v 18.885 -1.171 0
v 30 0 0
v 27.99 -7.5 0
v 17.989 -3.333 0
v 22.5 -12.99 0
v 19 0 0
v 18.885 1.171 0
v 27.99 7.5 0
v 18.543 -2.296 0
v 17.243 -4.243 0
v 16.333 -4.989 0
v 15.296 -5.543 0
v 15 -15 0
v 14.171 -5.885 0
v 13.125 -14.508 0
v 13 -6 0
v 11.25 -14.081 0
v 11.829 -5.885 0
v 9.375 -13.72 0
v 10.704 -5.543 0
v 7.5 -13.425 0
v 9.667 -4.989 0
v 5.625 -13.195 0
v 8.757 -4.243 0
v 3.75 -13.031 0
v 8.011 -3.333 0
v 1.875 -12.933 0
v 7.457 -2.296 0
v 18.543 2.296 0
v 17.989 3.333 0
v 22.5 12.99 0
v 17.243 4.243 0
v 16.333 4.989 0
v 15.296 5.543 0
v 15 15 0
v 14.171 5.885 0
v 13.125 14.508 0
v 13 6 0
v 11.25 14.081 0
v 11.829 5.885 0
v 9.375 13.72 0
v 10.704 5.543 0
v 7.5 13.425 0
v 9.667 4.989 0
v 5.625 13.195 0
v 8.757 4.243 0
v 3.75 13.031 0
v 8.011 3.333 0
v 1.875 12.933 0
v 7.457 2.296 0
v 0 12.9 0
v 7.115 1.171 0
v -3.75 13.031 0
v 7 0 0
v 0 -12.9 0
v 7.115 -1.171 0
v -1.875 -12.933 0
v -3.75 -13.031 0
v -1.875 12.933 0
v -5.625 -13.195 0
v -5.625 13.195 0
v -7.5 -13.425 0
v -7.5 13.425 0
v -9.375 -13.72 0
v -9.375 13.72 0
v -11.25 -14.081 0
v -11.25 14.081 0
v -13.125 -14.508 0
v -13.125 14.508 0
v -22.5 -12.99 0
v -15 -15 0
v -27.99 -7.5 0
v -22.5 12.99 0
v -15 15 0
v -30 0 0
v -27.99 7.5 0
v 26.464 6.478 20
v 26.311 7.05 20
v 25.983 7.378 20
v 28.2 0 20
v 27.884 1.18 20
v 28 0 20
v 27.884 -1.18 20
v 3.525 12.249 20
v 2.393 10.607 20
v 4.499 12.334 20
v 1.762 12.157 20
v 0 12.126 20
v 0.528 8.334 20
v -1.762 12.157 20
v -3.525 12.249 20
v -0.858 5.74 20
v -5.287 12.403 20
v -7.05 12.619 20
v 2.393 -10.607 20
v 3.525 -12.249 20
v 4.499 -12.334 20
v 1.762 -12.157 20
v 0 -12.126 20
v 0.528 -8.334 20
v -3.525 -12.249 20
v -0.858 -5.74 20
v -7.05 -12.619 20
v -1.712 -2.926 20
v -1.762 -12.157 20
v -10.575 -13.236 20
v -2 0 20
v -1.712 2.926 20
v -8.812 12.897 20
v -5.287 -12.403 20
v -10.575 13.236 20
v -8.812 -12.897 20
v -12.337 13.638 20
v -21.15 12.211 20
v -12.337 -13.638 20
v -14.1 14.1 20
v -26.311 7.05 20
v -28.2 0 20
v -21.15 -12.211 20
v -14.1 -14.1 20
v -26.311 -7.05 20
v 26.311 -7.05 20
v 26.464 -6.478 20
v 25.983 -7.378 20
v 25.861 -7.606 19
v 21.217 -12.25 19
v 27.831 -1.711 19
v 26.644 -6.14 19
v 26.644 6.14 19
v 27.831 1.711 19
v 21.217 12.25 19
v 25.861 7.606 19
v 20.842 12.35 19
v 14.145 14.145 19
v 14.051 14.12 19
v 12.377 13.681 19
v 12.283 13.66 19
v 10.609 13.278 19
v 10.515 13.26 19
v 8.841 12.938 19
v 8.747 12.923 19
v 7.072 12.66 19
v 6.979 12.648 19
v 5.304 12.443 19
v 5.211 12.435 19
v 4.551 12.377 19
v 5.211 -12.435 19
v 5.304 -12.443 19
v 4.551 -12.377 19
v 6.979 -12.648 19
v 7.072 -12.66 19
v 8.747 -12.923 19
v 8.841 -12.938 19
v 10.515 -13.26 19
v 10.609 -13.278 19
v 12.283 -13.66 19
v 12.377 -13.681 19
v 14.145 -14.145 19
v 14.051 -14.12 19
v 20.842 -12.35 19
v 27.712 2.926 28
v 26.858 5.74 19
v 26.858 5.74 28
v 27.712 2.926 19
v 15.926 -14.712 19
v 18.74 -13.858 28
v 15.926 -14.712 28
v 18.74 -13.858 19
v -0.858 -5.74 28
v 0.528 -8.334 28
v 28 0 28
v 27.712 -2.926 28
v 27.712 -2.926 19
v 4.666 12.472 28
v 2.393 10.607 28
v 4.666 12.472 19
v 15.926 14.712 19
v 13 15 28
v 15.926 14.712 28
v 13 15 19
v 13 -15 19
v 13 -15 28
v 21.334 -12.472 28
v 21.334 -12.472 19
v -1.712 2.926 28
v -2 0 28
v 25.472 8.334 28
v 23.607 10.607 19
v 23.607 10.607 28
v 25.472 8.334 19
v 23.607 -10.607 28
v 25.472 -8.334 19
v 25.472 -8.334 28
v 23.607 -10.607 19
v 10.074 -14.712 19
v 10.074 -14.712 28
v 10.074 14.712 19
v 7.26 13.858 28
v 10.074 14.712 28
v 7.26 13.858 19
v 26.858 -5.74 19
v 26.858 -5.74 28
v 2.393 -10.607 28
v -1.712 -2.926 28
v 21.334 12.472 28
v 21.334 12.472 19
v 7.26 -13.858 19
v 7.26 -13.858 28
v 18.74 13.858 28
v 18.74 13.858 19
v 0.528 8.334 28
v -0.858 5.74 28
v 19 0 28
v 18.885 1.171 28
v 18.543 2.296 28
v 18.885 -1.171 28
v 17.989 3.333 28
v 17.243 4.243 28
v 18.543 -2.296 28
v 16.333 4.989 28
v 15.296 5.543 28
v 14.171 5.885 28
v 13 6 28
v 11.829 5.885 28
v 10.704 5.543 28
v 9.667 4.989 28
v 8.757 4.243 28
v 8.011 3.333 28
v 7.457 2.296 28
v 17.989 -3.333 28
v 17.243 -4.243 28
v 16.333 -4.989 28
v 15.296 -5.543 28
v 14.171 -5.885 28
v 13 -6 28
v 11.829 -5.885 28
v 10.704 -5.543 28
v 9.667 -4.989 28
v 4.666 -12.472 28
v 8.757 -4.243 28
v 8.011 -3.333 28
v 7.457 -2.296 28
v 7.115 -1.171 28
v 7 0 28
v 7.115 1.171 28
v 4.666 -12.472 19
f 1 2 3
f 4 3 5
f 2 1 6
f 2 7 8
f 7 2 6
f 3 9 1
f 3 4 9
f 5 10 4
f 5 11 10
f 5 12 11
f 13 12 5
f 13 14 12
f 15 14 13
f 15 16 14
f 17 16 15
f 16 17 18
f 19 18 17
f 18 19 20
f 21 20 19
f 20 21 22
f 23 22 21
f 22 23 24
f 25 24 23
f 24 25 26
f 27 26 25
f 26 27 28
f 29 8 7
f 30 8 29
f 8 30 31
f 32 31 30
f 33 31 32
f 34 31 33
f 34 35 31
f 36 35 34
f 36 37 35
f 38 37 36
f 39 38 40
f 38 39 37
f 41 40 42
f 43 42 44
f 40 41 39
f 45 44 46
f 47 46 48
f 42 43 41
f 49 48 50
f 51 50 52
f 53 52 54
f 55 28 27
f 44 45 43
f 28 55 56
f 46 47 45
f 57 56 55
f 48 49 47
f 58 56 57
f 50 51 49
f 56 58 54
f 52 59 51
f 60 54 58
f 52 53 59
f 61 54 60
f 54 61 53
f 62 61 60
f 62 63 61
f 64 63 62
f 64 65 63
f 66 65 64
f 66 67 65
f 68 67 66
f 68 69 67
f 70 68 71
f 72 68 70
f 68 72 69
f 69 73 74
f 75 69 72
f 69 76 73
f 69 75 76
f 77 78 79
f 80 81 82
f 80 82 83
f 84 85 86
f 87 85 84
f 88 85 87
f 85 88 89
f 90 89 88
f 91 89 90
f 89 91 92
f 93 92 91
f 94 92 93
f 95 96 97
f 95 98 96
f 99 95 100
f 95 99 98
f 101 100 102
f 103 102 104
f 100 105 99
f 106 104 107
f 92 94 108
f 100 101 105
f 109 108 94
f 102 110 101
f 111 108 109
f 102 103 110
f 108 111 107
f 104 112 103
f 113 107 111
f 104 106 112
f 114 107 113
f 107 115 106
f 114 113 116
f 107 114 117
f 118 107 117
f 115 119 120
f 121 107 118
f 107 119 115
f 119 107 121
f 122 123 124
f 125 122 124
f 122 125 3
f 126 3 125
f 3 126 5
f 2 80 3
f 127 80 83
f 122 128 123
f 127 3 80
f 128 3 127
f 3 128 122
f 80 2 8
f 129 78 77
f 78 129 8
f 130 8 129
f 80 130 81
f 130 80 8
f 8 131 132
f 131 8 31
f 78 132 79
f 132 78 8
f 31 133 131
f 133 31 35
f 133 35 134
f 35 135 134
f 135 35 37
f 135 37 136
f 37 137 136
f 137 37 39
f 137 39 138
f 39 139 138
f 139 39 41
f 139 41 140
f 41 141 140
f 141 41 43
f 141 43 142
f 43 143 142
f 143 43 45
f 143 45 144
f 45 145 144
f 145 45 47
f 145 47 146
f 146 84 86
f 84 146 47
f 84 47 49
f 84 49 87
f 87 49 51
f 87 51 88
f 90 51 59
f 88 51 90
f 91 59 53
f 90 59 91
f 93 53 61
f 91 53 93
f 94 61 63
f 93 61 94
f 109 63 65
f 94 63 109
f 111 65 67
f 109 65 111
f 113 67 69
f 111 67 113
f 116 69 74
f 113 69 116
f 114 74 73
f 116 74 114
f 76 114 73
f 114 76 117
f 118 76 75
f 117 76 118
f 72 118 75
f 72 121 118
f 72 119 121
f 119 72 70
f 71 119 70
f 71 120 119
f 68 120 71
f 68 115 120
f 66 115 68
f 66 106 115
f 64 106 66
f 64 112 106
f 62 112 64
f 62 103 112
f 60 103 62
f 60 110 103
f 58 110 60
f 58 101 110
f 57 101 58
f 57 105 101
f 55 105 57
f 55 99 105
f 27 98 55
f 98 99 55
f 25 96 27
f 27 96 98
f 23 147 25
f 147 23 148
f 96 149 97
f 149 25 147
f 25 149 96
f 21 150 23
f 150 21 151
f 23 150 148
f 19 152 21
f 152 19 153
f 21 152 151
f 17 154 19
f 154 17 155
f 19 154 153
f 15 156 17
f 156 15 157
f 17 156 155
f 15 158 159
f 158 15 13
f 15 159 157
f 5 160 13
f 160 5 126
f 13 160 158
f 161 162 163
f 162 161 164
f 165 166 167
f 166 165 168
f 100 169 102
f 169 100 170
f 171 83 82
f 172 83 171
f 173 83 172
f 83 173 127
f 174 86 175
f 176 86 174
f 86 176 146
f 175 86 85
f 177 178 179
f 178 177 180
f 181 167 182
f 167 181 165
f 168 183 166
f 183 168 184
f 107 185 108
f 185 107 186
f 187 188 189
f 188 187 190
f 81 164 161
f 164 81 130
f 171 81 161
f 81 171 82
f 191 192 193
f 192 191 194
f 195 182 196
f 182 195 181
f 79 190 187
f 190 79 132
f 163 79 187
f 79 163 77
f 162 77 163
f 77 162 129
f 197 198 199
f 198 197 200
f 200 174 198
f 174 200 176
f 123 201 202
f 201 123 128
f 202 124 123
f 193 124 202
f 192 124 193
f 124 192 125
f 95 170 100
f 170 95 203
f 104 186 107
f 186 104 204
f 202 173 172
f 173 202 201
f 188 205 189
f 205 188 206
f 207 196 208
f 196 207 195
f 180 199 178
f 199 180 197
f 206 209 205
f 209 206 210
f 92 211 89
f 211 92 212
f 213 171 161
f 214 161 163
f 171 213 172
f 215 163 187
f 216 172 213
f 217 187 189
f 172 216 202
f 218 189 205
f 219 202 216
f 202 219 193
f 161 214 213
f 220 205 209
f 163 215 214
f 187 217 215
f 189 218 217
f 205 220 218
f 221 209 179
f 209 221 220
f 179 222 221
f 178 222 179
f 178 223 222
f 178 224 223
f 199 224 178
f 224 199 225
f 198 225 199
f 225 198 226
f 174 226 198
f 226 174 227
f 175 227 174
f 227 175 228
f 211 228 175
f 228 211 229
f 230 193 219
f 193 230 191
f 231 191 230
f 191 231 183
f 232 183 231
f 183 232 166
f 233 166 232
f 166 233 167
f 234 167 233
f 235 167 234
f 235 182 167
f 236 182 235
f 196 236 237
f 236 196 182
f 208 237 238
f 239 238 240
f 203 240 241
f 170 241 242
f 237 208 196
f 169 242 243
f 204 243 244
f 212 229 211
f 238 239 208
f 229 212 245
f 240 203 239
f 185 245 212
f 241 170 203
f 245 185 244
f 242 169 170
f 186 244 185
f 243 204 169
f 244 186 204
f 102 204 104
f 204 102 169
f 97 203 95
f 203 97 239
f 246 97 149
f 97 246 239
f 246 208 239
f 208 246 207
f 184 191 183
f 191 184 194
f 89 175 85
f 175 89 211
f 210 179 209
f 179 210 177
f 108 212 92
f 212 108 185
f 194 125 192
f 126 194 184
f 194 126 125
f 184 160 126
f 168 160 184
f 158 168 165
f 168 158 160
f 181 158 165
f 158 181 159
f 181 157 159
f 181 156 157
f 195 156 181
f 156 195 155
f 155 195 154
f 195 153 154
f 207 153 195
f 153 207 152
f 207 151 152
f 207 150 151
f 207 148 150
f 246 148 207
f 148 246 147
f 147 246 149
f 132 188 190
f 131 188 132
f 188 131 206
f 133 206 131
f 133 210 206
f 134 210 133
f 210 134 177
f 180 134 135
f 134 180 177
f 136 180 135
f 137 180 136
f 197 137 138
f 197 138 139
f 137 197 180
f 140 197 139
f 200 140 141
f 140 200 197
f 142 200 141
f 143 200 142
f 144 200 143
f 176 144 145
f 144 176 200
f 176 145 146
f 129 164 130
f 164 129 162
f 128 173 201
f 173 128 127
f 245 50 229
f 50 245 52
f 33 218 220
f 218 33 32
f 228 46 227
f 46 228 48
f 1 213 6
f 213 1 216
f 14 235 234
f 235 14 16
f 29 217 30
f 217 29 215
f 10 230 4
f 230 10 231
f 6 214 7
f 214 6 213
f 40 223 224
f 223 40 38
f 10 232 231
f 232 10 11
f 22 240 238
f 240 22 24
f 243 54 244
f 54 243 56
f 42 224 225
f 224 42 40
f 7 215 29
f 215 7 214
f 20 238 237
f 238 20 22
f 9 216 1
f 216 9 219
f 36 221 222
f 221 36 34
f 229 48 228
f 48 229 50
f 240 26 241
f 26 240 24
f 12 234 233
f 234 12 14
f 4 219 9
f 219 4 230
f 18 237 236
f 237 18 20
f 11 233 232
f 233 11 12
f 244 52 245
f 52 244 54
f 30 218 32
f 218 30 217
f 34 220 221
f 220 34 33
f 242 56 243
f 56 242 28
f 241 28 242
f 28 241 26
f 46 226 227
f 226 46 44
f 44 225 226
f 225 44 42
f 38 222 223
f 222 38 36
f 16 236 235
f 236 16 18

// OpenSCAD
$fn = 32;

// ----------------------------------------------------------------------
// Handle: 60 x 30 mm grip, 20 mm thick
// ----------------------------------------------------------------------

// --- parameters (mm) ---
length = 60;              // grip length
width = 30;               // grip width
thickness = 20;           // grip thickness
waist = 0.86;             // width factor at the middle
draft = 0.94;             // top face scale of the extrusion
boss_d = 30;              // mounting boss diameter
boss_h = 8;               // mounting boss height
boss_hole_d = 12;         // screw clearance through the boss
boss_r = 13;              // boss centre from the grip centre

/* ergonomic grip outline, closed spline-like polygon in the XY plane */
grip = [[-15, 15], [-13.125, 14.508], [-11.25, 14.081], [-9.375, 13.72], [-7.5, 13.425], [-5.625, 13.195], [-3.75, 13.031], [-1.875, 12.933], [0, 12.9], [1.875, 12.933], [3.75, 13.031], [5.625, 13.195], [7.5, 13.425], [9.375, 13.72], [11.25, 14.081], [13.125, 14.508], [15, 15], [22.5, 12.99], [27.99, 7.5], [30, 0], [27.99, -7.5], [22.5, -12.99], [15, -15], [15, -15], [13.125, -14.508], [11.25, -14.081], [9.375, -13.72], [7.5, -13.425], [5.625, -13.195], [3.75, -13.031], [1.875, -12.933], [0, -12.9], [-1.875, -12.933], [-3.75, -13.031], [-5.625, -13.195], [-7.5, -13.425], [-9.375, -13.72], [-11.25, -14.081], [-13.125, -14.508], [-15, -15], [-22.5, -12.99], [-27.99, -7.5], [-30, 0], [-27.99, 7.5], [-22.5, 12.99], [-15, 15]];

module grip_body() {
  linear_extrude(height = thickness, scale = draft) polygon(grip);
}

module boss_body() {
  /* sunk 1 mm into the grip so the joint overlaps */
  translate([boss_r, 0, thickness - 1]) cylinder(h = boss_h + 1, d = boss_d);
}

difference() {
  union() {
    grip_body();
    boss_body();
  }
  translate([boss_r, 0, -1]) cylinder(h = thickness + boss_h + 2, d = boss_hole_d);
}
